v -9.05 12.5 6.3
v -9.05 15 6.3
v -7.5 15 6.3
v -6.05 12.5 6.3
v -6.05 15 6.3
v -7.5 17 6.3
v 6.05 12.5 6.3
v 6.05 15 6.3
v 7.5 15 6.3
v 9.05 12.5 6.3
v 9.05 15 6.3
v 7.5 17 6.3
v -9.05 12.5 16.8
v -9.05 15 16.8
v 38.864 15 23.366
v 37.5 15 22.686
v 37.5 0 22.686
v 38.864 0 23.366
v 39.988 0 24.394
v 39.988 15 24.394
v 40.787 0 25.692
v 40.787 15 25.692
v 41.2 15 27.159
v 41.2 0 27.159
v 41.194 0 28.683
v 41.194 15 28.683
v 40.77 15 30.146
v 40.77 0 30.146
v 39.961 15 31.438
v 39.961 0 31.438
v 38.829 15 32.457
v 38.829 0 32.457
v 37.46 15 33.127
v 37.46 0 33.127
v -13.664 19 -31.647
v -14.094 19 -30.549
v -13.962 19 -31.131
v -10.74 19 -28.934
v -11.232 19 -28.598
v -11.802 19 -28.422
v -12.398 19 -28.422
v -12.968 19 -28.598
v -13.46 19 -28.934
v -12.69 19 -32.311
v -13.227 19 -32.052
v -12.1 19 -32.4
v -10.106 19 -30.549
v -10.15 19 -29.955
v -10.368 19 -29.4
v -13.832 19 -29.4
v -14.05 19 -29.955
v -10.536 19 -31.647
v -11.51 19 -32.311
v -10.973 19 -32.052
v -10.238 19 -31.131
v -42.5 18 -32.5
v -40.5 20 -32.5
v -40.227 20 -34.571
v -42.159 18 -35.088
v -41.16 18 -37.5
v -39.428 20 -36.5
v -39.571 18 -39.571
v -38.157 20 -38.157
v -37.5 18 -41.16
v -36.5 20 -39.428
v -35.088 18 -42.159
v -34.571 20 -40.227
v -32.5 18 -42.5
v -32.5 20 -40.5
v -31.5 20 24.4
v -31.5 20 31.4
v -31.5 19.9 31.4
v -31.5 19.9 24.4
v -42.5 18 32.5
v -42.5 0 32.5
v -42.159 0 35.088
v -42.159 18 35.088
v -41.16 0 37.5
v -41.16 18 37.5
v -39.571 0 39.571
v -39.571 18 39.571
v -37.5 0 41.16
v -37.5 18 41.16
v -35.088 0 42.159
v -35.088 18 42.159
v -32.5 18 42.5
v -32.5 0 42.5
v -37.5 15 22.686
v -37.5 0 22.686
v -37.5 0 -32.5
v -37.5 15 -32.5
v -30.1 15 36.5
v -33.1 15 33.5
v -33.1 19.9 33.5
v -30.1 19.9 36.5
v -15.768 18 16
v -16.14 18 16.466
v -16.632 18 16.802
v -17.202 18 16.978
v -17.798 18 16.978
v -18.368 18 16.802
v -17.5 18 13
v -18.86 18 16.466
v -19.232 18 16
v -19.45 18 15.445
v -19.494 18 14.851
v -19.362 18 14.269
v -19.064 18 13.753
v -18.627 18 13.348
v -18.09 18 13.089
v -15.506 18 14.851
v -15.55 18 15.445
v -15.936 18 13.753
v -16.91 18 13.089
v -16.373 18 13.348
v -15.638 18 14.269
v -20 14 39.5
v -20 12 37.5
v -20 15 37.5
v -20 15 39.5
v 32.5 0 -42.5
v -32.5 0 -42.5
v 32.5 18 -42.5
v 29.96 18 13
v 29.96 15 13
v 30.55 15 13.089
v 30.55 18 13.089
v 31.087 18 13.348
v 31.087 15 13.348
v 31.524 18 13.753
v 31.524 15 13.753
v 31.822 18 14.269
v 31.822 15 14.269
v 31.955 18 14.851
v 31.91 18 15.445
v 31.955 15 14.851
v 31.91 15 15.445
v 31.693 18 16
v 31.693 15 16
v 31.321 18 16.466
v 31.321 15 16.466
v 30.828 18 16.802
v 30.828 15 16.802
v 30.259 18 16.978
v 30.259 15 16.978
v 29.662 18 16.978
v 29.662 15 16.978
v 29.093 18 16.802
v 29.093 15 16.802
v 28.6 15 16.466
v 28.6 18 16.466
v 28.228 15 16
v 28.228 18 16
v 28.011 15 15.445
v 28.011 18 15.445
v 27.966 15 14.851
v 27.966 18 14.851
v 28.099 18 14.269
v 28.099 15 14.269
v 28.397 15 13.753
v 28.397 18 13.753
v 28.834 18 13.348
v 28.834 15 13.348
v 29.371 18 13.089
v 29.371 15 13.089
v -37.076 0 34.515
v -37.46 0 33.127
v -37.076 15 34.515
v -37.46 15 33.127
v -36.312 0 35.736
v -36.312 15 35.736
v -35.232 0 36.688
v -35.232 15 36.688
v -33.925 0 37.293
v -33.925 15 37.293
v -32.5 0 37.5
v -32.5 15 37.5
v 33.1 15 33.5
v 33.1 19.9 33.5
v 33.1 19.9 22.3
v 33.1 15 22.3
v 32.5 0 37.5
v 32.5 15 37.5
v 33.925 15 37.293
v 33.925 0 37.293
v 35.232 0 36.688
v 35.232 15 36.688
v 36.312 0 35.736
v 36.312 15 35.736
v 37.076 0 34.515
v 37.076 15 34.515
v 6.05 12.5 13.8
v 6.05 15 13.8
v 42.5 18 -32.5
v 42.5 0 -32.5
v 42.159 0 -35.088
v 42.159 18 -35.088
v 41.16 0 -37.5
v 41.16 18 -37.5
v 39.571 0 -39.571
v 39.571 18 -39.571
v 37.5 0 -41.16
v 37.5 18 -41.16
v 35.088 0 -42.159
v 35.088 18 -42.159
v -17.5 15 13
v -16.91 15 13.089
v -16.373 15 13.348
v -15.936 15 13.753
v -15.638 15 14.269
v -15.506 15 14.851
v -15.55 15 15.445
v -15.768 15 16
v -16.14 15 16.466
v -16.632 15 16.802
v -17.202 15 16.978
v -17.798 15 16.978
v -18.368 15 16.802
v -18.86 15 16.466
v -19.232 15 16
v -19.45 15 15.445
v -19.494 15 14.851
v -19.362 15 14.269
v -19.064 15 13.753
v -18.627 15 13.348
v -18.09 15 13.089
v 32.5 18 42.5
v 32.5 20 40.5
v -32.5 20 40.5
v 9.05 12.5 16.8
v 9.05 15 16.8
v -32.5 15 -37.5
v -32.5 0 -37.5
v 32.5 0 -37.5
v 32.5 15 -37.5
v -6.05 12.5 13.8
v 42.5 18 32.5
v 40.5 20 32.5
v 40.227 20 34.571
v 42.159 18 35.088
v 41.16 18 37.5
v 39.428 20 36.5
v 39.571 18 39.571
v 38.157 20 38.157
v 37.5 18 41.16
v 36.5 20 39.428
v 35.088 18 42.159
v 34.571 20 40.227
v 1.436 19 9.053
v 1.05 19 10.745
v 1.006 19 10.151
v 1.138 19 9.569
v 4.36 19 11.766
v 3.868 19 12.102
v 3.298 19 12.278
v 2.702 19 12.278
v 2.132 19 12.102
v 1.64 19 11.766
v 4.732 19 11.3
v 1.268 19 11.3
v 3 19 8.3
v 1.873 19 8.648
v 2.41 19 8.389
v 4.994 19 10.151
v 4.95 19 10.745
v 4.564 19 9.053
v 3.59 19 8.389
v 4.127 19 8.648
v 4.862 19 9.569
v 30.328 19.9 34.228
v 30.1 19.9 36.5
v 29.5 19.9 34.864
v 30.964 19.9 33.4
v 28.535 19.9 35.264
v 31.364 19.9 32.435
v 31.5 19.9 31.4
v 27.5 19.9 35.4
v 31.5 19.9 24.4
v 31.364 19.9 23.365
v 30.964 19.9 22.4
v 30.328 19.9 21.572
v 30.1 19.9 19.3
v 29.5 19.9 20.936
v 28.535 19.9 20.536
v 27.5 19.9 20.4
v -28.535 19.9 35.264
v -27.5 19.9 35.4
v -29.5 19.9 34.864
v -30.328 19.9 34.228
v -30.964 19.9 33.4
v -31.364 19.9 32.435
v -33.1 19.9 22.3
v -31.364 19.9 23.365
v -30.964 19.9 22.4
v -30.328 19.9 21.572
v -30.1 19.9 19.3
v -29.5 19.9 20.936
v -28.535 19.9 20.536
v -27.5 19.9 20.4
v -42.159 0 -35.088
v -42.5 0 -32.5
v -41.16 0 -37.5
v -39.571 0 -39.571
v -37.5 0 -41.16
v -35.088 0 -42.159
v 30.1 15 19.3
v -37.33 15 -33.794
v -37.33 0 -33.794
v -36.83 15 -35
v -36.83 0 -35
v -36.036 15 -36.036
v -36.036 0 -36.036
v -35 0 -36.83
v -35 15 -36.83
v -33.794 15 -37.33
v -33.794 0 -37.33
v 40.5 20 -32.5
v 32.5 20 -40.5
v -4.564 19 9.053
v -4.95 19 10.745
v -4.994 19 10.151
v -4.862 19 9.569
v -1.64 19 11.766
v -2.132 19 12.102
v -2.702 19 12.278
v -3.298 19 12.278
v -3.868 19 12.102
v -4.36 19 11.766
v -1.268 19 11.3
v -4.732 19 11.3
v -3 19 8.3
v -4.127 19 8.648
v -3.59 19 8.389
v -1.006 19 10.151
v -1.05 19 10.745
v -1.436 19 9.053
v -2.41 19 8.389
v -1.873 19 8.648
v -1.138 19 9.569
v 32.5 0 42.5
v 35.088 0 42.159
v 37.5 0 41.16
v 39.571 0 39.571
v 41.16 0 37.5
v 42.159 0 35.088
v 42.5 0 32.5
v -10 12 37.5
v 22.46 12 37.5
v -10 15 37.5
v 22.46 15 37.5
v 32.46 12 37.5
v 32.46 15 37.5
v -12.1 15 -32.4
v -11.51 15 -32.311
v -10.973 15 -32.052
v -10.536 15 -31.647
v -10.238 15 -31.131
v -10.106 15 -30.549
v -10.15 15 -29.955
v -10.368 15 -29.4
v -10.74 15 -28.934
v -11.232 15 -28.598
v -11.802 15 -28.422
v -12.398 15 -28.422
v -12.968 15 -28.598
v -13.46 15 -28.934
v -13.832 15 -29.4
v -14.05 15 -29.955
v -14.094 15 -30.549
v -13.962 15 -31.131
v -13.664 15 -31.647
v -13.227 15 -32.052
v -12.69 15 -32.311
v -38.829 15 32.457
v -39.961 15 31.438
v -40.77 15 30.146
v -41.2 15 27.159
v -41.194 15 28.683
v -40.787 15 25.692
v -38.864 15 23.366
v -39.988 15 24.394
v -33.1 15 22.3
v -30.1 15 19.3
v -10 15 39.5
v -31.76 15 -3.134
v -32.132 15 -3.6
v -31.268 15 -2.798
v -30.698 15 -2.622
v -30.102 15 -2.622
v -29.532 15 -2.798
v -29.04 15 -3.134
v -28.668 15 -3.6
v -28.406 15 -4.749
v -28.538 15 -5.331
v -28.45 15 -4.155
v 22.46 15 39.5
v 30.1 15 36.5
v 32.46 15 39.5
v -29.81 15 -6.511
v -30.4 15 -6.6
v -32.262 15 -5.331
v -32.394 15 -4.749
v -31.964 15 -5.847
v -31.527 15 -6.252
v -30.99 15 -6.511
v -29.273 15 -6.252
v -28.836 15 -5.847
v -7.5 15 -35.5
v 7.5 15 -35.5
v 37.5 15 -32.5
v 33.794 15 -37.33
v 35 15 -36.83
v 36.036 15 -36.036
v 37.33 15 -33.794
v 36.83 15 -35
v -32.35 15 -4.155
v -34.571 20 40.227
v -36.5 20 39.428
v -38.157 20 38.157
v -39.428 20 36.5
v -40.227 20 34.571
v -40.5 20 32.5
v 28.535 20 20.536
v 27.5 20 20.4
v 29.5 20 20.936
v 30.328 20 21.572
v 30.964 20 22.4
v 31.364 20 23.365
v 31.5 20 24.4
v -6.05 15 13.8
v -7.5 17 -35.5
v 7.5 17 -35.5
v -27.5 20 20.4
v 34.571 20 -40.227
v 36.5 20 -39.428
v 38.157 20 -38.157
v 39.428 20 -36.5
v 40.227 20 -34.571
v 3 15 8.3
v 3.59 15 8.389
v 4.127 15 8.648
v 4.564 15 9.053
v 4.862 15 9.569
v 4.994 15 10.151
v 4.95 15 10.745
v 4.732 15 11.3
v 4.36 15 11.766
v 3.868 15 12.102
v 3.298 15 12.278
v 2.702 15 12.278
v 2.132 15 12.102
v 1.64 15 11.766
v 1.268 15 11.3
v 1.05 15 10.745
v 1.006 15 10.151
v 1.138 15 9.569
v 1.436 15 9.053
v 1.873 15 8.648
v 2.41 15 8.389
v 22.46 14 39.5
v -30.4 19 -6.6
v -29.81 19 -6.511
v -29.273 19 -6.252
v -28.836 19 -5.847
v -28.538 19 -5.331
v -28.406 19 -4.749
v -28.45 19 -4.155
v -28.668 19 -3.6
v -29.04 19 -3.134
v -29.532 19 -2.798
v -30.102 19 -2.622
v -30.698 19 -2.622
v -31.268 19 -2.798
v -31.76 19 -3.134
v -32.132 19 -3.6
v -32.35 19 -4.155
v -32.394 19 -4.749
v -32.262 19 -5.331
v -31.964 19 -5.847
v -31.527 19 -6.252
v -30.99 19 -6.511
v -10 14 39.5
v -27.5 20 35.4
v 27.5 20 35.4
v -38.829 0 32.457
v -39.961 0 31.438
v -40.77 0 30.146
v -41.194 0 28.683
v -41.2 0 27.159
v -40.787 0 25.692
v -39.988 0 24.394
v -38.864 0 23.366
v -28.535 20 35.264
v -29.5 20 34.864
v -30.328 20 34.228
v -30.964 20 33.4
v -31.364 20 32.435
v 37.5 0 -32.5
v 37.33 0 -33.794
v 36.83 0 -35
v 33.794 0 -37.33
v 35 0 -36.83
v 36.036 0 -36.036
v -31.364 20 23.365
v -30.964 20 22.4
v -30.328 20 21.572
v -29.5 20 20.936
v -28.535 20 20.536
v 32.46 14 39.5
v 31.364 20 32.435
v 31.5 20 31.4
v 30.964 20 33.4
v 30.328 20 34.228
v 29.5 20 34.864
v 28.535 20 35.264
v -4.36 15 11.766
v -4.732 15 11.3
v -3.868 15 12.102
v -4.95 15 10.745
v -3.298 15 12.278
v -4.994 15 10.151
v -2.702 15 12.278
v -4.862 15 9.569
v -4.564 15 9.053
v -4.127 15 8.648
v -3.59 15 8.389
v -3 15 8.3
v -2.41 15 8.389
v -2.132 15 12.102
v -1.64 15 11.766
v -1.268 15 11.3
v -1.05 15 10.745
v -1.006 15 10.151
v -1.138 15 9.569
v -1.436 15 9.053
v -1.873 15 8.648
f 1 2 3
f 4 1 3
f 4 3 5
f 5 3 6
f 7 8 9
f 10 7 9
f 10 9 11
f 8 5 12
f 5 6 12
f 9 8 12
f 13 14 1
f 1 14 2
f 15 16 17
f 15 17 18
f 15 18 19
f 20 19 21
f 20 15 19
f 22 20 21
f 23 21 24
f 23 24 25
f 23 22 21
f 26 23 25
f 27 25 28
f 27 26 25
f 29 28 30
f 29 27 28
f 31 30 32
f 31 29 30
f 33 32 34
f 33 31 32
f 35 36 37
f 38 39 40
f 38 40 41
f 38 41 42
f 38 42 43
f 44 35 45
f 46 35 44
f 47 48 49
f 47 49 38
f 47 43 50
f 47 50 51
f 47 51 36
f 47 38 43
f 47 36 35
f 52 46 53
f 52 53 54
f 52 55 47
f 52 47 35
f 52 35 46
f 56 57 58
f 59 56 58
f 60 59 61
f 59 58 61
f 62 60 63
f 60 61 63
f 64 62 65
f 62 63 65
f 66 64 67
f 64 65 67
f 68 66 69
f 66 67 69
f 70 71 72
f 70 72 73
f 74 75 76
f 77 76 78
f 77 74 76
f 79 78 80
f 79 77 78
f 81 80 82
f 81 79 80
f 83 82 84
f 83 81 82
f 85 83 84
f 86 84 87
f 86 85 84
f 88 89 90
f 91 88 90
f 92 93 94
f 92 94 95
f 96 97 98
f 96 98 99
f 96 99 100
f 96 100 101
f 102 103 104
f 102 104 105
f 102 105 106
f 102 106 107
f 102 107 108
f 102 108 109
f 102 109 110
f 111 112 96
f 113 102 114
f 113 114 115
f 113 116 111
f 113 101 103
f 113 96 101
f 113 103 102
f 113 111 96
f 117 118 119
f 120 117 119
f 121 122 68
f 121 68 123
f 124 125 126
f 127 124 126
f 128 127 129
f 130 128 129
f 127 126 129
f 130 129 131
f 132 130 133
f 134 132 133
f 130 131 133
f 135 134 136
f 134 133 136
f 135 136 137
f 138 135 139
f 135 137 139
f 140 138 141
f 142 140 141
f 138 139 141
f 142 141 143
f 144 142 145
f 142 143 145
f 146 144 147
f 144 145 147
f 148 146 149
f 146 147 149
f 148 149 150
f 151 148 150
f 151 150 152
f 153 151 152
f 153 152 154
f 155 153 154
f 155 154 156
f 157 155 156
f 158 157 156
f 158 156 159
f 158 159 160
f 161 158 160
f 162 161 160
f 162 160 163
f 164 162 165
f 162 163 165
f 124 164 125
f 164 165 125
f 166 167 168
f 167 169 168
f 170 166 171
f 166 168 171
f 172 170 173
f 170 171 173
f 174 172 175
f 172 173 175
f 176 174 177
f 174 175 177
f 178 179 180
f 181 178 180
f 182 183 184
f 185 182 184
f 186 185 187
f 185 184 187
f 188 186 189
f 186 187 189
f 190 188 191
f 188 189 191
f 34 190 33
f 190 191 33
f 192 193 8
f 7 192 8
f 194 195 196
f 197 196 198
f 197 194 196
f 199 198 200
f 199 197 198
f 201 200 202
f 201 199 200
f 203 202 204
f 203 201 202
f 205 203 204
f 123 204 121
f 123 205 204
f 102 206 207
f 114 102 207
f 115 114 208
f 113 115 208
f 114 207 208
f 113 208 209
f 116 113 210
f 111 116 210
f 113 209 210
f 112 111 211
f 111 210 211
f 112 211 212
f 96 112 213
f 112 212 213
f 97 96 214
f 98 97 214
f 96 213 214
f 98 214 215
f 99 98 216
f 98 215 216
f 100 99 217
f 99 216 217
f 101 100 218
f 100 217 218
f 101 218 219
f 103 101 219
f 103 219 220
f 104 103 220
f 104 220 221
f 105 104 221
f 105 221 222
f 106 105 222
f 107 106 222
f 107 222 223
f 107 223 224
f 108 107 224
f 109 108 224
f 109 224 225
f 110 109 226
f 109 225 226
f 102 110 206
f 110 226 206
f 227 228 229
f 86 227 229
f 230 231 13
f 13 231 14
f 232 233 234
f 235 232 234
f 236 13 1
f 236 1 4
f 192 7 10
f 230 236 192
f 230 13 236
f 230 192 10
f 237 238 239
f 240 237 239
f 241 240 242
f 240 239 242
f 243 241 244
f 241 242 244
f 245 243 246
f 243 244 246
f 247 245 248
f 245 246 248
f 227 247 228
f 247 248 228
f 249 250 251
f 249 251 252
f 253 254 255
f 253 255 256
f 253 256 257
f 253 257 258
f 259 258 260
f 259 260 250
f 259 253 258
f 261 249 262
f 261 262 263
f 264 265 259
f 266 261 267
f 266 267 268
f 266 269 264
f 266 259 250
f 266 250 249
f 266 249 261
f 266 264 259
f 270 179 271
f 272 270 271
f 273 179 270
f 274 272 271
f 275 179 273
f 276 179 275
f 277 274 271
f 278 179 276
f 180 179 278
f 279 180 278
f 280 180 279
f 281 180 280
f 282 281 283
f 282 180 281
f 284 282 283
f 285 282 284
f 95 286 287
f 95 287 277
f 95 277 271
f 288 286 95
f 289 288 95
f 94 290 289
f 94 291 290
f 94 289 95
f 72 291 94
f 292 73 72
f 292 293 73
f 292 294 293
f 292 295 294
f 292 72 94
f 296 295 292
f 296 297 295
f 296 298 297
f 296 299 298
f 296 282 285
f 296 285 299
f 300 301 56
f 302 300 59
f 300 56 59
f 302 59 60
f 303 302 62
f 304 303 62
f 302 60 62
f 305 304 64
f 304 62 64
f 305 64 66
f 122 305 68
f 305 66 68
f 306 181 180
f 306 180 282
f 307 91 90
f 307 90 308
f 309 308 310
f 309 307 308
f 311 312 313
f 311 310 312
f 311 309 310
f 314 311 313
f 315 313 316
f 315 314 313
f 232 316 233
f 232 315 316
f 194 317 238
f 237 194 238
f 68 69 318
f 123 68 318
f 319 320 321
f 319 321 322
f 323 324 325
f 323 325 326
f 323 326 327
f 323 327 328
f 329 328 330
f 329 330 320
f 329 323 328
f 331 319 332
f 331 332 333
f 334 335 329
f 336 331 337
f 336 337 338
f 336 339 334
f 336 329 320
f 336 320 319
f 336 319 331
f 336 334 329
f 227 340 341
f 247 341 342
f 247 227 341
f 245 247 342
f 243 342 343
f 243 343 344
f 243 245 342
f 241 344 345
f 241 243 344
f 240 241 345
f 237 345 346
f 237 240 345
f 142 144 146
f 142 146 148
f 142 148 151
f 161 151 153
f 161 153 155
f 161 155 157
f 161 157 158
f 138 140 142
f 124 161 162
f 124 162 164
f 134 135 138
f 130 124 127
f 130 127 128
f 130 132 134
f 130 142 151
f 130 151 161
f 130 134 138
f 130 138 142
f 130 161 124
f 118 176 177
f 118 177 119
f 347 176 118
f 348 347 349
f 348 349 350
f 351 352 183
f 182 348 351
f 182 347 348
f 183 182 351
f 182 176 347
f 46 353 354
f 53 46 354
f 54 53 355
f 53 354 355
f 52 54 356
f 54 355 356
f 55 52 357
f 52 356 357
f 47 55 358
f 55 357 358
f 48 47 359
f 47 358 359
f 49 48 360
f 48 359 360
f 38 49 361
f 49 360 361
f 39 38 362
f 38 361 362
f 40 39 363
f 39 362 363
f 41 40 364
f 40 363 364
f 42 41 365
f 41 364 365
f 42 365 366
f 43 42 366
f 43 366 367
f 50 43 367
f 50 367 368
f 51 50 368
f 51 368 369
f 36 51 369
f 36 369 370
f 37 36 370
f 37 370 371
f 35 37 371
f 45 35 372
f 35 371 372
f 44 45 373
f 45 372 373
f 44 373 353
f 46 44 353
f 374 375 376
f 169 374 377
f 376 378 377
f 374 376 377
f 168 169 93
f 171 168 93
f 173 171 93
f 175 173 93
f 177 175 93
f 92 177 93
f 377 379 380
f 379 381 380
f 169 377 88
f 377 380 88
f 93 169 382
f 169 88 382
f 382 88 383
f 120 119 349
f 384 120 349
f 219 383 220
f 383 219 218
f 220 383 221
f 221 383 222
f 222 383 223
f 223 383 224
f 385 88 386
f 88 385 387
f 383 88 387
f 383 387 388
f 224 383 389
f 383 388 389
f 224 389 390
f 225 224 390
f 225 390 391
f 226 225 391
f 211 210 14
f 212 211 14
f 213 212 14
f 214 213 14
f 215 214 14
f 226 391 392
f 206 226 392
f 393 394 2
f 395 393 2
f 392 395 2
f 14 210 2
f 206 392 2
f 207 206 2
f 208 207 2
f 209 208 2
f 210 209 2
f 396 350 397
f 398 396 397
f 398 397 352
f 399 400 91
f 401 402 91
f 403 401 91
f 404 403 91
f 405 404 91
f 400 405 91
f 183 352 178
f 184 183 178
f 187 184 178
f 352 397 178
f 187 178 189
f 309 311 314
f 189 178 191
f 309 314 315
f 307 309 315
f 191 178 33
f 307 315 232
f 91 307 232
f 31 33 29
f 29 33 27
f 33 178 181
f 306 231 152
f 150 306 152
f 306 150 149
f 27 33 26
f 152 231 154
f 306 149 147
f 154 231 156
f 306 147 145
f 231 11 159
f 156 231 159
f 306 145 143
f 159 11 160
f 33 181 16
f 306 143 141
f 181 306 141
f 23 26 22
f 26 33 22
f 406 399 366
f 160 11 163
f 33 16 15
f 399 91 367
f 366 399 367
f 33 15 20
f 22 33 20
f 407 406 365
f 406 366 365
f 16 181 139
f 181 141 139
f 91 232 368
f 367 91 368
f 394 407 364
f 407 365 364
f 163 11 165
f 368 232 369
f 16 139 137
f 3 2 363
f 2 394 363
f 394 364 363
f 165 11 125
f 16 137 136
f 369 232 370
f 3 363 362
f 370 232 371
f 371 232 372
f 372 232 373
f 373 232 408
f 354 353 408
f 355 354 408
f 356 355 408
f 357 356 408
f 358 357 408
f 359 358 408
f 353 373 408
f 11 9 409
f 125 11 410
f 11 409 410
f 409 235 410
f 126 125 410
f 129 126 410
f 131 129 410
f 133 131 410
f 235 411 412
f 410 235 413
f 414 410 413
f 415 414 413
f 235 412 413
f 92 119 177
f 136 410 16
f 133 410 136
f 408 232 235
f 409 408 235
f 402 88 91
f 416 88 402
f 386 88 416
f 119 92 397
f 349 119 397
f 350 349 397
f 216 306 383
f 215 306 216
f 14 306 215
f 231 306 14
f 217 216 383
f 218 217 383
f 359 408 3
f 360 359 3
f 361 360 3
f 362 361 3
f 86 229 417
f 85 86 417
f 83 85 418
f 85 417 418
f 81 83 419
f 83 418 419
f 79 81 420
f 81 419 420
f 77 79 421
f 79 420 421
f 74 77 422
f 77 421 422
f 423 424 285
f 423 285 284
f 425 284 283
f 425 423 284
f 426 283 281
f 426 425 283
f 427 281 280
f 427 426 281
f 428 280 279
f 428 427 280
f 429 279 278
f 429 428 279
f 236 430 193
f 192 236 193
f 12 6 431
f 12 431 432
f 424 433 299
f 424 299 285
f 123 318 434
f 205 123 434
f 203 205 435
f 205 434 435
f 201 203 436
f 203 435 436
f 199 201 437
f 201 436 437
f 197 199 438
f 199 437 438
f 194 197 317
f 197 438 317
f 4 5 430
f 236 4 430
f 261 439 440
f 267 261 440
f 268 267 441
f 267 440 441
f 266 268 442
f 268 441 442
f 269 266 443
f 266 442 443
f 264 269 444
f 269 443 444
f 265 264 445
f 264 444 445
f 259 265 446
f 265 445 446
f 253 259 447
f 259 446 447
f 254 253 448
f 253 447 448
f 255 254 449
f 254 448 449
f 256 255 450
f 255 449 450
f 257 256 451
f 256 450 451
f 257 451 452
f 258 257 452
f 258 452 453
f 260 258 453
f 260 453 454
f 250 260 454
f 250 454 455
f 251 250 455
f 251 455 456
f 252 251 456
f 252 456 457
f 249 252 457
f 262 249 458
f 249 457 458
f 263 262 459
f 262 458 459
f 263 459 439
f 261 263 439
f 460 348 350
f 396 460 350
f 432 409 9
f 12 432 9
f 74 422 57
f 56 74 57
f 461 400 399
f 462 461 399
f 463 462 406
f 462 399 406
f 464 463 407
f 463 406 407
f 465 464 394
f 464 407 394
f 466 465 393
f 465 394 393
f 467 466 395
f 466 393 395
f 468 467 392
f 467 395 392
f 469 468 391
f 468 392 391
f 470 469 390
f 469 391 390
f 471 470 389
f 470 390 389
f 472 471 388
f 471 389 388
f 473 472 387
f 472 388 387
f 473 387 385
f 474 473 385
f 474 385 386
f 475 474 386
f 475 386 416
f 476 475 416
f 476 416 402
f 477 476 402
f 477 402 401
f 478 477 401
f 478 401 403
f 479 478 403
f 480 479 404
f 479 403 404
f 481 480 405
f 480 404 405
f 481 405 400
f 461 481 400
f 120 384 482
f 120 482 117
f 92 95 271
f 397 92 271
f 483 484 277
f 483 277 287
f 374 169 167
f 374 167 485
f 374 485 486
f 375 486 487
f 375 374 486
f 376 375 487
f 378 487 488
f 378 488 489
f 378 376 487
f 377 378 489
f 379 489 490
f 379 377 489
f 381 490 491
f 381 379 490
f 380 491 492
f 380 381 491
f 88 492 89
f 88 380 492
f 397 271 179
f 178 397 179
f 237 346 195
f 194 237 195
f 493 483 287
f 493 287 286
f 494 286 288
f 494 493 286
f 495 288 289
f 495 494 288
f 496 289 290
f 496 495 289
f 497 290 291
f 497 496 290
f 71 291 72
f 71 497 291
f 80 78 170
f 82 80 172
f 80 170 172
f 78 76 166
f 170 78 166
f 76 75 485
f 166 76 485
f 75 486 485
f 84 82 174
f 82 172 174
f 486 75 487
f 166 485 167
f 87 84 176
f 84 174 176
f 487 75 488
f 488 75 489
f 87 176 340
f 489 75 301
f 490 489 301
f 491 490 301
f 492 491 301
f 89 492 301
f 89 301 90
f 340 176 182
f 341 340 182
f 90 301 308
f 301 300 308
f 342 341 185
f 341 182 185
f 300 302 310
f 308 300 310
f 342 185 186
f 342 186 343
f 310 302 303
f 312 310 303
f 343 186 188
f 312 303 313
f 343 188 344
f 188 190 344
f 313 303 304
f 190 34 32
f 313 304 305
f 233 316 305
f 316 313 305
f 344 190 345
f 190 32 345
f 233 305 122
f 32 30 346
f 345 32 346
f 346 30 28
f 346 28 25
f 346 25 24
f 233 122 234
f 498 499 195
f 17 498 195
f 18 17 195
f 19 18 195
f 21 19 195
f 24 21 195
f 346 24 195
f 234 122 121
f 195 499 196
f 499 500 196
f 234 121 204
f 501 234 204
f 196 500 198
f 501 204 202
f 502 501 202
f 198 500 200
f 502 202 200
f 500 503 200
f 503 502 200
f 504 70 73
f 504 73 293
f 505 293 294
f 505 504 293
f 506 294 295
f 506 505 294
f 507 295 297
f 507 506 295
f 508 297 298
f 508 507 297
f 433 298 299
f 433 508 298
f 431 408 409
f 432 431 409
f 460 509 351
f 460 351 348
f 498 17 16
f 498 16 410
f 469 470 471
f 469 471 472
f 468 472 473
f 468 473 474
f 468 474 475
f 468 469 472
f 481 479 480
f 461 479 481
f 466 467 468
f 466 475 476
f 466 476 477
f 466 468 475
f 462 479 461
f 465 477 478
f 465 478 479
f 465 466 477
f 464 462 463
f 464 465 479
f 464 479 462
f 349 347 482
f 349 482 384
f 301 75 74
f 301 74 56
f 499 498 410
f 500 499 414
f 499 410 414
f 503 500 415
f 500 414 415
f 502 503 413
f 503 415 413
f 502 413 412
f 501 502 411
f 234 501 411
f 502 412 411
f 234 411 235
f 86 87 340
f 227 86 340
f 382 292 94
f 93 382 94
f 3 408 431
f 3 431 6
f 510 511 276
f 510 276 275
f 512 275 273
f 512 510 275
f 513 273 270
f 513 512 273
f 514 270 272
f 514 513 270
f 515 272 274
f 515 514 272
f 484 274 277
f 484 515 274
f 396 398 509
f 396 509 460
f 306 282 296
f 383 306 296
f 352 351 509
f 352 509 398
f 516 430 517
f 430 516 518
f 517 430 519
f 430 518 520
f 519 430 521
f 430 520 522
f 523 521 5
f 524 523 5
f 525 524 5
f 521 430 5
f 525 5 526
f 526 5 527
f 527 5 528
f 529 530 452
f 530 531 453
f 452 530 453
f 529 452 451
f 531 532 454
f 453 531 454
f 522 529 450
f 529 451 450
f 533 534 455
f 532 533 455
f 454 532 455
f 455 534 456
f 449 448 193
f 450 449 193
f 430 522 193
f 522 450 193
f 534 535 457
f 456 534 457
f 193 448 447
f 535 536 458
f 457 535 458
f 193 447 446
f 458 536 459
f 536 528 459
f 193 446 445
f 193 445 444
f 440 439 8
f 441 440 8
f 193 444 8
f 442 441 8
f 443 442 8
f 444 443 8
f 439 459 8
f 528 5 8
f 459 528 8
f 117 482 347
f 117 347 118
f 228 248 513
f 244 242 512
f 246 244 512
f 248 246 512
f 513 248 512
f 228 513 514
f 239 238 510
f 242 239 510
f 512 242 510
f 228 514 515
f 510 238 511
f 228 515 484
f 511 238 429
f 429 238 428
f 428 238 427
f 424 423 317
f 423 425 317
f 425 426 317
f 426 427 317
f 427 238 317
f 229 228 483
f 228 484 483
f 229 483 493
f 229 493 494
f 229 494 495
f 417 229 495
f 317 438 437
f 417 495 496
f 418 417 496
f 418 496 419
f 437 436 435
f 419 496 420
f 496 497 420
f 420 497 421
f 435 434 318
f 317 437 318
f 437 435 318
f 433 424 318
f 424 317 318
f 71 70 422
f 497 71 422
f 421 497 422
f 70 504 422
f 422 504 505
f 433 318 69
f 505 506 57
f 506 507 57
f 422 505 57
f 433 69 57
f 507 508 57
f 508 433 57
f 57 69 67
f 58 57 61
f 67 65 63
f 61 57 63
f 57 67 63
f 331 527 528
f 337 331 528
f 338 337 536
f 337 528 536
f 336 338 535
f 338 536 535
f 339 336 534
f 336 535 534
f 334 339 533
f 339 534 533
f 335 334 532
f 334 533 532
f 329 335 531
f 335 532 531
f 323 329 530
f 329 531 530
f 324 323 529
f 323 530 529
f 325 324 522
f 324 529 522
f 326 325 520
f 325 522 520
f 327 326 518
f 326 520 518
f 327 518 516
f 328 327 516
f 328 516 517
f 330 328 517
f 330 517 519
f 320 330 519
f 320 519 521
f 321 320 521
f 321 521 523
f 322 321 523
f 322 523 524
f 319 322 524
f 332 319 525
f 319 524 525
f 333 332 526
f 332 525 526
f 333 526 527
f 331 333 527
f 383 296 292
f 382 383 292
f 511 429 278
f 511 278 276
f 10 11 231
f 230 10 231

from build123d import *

# Parameters (mm, degrees)
SKETCH1_W           = 85
SKETCH1_H           = 85
BOSS_EXTRUDE1_DEPTH = 20
FILLET1_R           = 10
CHAMFER1_SIZE       = 2
SHELL2_T            = -5
CUT_EXTRUDE1_DEPTH  = 64.344297297
SKETCH3_W           = 15
SKETCH3_H           = 41.8
CUT_EXTRUDE2_DEPTH  = 2
SKETCH3_4_R         = 2
CUT_EXTRUDE3_DEPTH  = 4
BOSS_EXTRUDE2_DEPTH = 0.1
CUT_EXTRUDE9_START  = -15
CUT_EXTRUDE9_DEPTH  = 15
SKETCH17_W          = 10
SKETCH17_H          = 1
CUT_EXTRUDE10_DEPTH = 2
CHAMFER4_SIZE       = 2
SKETCH18_R          = 2
CUT_EXTRUDE11_DEPTH = 3
SKETCH19_W          = 12.1
SKETCH19_H          = 3
BOSS_EXTRUDE8_DEPTH = 2.5
SKETCH20_R          = 2
CUT_EXTRUDE12_DEPTH = 4


with BuildPart() as part:
    # Sketch1 → Boss-Extrude1 (new body)
    with BuildSketch(Plane(origin=(0, 0, 0), x_dir=(1, 0, 0), z_dir=(0, 1, 0))):
        Rectangle(SKETCH1_W, SKETCH1_H)
    extrude(amount=BOSS_EXTRUDE1_DEPTH)

    # Fillet1
    fillet1_edges = [part.edges().sort_by_distance(p)[0] for p in [
        (42.5, 10, 42.5),
        (-42.5, 10, 42.5),
        (-42.5, 10, -42.5),
        (42.5, 10, -42.5),
    ]]
    fillet(fillet1_edges, radius=FILLET1_R)

    # Chamfer1
    chamfer1_edges = [part.edges().sort_by_distance(p)[0] for p in [
        (-42.5, 20, 0),
        (0, 20, -42.5),
        (42.5, 20, 0),
        (0, 20, 42.5),
        (-39.571067812, 20, 39.571067812),
        (39.571067812, 20, 39.571067812),
        (39.571067812, 20, -39.571067812),
        (-39.571067812, 20, -39.571067812),
    ]]
    chamfer(chamfer1_edges, length=CHAMFER1_SIZE)

    # Shell2
    shell2_openings = [part.faces().sort_by_distance(p)[0] for p in [
        (0, 0, 0),
    ]]
    offset(amount=SHELL2_T, openings=shell2_openings, kind=Kind.INTERSECTION)

    # Sketch2 → Cut-Extrude1 (cut, through all)
    with BuildSketch(Plane(origin=(0, 20, 0), x_dir=(1, 0, 0), z_dir=(0, 1, 0))):
        Polygon((-30.1, -36.5), (30.1, -36.5), (33.1, -33.5), (33.1, -22.3), (30.1, -19.3), (-30.1, -19.3), (-33.1, -22.3), (-33.1, -33.5), align=None)
    extrude(amount=-CUT_EXTRUDE1_DEPTH, mode=Mode.SUBTRACT)

    # Sketch3 → Cut-Extrude2 (cut)
    with BuildSketch(Plane.XZ.offset(-15)):
        with Locations((0, -14.6)):
            Rectangle(SKETCH3_W, SKETCH3_H)
    extrude(amount=-CUT_EXTRUDE2_DEPTH, mode=Mode.SUBTRACT)

    # Sketch3<4> → Cut-Extrude3 (cut)
    with BuildSketch(Plane.XZ.offset(-15)):
        with Locations(Location((-3, 10.3, 0), (0, 0, 270))):
            Circle(SKETCH3_4_R)
        with Locations(Location((3, 10.3, 0), (0, 0, 270))):
            Circle(SKETCH3_4_R)
    extrude(amount=-CUT_EXTRUDE3_DEPTH, mode=Mode.SUBTRACT)

    # Sketch4 → Boss-Extrude2 (add)
    with BuildSketch(Plane(origin=(0, 20, 0), x_dir=(1, 0, 0), z_dir=(0, 1, 0))):
        Polygon((-33.1, -33.5), (-33.1, -22.3), (-30.1, -19.3), (30.1, -19.3), (33.1, -22.3), (33.1, -33.5), (30.1, -36.5), (-30.1, -36.5), align=None)
        with BuildLine():
            Line((-31.5, -31.4), (-31.5, -24.4))
            ThreePointArc((-31.5, -24.4), (-30.328427125, -21.571572875), (-27.5, -20.4))
            Line((-27.5, -20.4), (27.5, -20.4))
            ThreePointArc((27.5, -20.4), (30.328427125, -21.571572875), (31.5, -24.4))
            Line((31.5, -24.4), (31.5, -31.4))
            ThreePointArc((31.5, -31.4), (30.328427125, -34.228427125), (27.5, -35.4))
            Line((27.5, -35.4), (-27.5, -35.4))
            ThreePointArc((-27.5, -35.4), (-30.328427125, -34.228427125), (-31.5, -31.4))
        make_face(mode=Mode.SUBTRACT)
    extrude(amount=-BOSS_EXTRUDE2_DEPTH)

    # Sketch5 → Cut-Extrude9 (cut)
    with BuildSketch(Plane.XZ.offset(CUT_EXTRUDE9_START)):
        with BuildLine():
            ThreePointArc((-37.460499109, 33.127254805), (-41.249960643, 27.920806881), (-37.5, 22.685836596))
            Line((-37.5, 22.685836596), (-37.5, 32.5))
            ThreePointArc((-37.5, 32.5), (-37.490115006, 32.814248672), (-37.460499109, 33.127254805))
        make_face()
        with BuildLine():
            Line((37.5, 32.5), (37.5, 22.685836596))
            ThreePointArc((37.5, 22.685836596), (41.249960643, 27.920806881), (37.460499109, 33.127254805))
            ThreePointArc((37.460499109, 33.127254805), (37.490115006, 32.814248672), (37.5, 32.5))
        make_face()
    extrude(amount=CUT_EXTRUDE9_DEPTH, mode=Mode.SUBTRACT)

    # Sketch17 → Cut-Extrude10 (cut)
    with BuildSketch(Plane(origin=(0, 0, 37.5), x_dir=(-1, 0, 0), z_dir=(0, 0, -1))):
        with Locations((-27.460499109, 14.5)):
            Rectangle(SKETCH17_W, SKETCH17_H)
        with Locations((15, 14.5)):
            Rectangle(SKETCH17_W, SKETCH17_H)
    extrude(amount=-CUT_EXTRUDE10_DEPTH, mode=Mode.SUBTRACT)

    # Chamfer4
    chamfer4_edges = [part.edges().sort_by_distance(p)[0] for p in [
        (27.460499109, 14, 37.5),
        (-15, 14, 37.5),
    ]]
    chamfer(chamfer4_edges, length=CHAMFER4_SIZE - 0.0001)  # a hair under: the kernel refuses the full size

    # Sketch18 → Cut-Extrude11 (cut)
    with BuildSketch(Plane.XZ.offset(-15)):
        with Locations(Location((-17.5, 15, 0), (0, 0, 270))):
            Circle(SKETCH18_R)
        with Locations(Location((29.960499109, 15, 0), (0, 0, 270))):
            Circle(SKETCH18_R)
    extrude(amount=-CUT_EXTRUDE11_DEPTH, mode=Mode.SUBTRACT)

    # Sketch19 → Boss-Extrude8 (add)
    with BuildSketch(Plane.XZ.offset(-15)):
        with Locations((0, 15.3)):
            Rectangle(SKETCH19_W, SKETCH19_H)
        Polygon((-6.05, 6.3), (-6.05, 13.8), (-6.05, 16.8), (-9.05, 16.8), (-9.05, 6.3), align=None)
        Polygon((6.05, 16.8), (6.05, 13.8), (6.05, 6.3), (9.05, 6.3), (9.05, 16.8), align=None)
    extrude(amount=BOSS_EXTRUDE8_DEPTH)

    # Sketch20 → Cut-Extrude12 (cut)
    with BuildSketch(Plane.XZ.offset(-15)):
        with Locations(Location((-30.4, -4.6, 0), (0, 0, 270))):
            Circle(SKETCH20_R)
        with Locations(Location((-12.1, -30.4, 0), (0, 0, 270))):
            Circle(SKETCH20_R)
    extrude(amount=-CUT_EXTRUDE12_DEPTH, mode=Mode.SUBTRACT)


solid = part.part
